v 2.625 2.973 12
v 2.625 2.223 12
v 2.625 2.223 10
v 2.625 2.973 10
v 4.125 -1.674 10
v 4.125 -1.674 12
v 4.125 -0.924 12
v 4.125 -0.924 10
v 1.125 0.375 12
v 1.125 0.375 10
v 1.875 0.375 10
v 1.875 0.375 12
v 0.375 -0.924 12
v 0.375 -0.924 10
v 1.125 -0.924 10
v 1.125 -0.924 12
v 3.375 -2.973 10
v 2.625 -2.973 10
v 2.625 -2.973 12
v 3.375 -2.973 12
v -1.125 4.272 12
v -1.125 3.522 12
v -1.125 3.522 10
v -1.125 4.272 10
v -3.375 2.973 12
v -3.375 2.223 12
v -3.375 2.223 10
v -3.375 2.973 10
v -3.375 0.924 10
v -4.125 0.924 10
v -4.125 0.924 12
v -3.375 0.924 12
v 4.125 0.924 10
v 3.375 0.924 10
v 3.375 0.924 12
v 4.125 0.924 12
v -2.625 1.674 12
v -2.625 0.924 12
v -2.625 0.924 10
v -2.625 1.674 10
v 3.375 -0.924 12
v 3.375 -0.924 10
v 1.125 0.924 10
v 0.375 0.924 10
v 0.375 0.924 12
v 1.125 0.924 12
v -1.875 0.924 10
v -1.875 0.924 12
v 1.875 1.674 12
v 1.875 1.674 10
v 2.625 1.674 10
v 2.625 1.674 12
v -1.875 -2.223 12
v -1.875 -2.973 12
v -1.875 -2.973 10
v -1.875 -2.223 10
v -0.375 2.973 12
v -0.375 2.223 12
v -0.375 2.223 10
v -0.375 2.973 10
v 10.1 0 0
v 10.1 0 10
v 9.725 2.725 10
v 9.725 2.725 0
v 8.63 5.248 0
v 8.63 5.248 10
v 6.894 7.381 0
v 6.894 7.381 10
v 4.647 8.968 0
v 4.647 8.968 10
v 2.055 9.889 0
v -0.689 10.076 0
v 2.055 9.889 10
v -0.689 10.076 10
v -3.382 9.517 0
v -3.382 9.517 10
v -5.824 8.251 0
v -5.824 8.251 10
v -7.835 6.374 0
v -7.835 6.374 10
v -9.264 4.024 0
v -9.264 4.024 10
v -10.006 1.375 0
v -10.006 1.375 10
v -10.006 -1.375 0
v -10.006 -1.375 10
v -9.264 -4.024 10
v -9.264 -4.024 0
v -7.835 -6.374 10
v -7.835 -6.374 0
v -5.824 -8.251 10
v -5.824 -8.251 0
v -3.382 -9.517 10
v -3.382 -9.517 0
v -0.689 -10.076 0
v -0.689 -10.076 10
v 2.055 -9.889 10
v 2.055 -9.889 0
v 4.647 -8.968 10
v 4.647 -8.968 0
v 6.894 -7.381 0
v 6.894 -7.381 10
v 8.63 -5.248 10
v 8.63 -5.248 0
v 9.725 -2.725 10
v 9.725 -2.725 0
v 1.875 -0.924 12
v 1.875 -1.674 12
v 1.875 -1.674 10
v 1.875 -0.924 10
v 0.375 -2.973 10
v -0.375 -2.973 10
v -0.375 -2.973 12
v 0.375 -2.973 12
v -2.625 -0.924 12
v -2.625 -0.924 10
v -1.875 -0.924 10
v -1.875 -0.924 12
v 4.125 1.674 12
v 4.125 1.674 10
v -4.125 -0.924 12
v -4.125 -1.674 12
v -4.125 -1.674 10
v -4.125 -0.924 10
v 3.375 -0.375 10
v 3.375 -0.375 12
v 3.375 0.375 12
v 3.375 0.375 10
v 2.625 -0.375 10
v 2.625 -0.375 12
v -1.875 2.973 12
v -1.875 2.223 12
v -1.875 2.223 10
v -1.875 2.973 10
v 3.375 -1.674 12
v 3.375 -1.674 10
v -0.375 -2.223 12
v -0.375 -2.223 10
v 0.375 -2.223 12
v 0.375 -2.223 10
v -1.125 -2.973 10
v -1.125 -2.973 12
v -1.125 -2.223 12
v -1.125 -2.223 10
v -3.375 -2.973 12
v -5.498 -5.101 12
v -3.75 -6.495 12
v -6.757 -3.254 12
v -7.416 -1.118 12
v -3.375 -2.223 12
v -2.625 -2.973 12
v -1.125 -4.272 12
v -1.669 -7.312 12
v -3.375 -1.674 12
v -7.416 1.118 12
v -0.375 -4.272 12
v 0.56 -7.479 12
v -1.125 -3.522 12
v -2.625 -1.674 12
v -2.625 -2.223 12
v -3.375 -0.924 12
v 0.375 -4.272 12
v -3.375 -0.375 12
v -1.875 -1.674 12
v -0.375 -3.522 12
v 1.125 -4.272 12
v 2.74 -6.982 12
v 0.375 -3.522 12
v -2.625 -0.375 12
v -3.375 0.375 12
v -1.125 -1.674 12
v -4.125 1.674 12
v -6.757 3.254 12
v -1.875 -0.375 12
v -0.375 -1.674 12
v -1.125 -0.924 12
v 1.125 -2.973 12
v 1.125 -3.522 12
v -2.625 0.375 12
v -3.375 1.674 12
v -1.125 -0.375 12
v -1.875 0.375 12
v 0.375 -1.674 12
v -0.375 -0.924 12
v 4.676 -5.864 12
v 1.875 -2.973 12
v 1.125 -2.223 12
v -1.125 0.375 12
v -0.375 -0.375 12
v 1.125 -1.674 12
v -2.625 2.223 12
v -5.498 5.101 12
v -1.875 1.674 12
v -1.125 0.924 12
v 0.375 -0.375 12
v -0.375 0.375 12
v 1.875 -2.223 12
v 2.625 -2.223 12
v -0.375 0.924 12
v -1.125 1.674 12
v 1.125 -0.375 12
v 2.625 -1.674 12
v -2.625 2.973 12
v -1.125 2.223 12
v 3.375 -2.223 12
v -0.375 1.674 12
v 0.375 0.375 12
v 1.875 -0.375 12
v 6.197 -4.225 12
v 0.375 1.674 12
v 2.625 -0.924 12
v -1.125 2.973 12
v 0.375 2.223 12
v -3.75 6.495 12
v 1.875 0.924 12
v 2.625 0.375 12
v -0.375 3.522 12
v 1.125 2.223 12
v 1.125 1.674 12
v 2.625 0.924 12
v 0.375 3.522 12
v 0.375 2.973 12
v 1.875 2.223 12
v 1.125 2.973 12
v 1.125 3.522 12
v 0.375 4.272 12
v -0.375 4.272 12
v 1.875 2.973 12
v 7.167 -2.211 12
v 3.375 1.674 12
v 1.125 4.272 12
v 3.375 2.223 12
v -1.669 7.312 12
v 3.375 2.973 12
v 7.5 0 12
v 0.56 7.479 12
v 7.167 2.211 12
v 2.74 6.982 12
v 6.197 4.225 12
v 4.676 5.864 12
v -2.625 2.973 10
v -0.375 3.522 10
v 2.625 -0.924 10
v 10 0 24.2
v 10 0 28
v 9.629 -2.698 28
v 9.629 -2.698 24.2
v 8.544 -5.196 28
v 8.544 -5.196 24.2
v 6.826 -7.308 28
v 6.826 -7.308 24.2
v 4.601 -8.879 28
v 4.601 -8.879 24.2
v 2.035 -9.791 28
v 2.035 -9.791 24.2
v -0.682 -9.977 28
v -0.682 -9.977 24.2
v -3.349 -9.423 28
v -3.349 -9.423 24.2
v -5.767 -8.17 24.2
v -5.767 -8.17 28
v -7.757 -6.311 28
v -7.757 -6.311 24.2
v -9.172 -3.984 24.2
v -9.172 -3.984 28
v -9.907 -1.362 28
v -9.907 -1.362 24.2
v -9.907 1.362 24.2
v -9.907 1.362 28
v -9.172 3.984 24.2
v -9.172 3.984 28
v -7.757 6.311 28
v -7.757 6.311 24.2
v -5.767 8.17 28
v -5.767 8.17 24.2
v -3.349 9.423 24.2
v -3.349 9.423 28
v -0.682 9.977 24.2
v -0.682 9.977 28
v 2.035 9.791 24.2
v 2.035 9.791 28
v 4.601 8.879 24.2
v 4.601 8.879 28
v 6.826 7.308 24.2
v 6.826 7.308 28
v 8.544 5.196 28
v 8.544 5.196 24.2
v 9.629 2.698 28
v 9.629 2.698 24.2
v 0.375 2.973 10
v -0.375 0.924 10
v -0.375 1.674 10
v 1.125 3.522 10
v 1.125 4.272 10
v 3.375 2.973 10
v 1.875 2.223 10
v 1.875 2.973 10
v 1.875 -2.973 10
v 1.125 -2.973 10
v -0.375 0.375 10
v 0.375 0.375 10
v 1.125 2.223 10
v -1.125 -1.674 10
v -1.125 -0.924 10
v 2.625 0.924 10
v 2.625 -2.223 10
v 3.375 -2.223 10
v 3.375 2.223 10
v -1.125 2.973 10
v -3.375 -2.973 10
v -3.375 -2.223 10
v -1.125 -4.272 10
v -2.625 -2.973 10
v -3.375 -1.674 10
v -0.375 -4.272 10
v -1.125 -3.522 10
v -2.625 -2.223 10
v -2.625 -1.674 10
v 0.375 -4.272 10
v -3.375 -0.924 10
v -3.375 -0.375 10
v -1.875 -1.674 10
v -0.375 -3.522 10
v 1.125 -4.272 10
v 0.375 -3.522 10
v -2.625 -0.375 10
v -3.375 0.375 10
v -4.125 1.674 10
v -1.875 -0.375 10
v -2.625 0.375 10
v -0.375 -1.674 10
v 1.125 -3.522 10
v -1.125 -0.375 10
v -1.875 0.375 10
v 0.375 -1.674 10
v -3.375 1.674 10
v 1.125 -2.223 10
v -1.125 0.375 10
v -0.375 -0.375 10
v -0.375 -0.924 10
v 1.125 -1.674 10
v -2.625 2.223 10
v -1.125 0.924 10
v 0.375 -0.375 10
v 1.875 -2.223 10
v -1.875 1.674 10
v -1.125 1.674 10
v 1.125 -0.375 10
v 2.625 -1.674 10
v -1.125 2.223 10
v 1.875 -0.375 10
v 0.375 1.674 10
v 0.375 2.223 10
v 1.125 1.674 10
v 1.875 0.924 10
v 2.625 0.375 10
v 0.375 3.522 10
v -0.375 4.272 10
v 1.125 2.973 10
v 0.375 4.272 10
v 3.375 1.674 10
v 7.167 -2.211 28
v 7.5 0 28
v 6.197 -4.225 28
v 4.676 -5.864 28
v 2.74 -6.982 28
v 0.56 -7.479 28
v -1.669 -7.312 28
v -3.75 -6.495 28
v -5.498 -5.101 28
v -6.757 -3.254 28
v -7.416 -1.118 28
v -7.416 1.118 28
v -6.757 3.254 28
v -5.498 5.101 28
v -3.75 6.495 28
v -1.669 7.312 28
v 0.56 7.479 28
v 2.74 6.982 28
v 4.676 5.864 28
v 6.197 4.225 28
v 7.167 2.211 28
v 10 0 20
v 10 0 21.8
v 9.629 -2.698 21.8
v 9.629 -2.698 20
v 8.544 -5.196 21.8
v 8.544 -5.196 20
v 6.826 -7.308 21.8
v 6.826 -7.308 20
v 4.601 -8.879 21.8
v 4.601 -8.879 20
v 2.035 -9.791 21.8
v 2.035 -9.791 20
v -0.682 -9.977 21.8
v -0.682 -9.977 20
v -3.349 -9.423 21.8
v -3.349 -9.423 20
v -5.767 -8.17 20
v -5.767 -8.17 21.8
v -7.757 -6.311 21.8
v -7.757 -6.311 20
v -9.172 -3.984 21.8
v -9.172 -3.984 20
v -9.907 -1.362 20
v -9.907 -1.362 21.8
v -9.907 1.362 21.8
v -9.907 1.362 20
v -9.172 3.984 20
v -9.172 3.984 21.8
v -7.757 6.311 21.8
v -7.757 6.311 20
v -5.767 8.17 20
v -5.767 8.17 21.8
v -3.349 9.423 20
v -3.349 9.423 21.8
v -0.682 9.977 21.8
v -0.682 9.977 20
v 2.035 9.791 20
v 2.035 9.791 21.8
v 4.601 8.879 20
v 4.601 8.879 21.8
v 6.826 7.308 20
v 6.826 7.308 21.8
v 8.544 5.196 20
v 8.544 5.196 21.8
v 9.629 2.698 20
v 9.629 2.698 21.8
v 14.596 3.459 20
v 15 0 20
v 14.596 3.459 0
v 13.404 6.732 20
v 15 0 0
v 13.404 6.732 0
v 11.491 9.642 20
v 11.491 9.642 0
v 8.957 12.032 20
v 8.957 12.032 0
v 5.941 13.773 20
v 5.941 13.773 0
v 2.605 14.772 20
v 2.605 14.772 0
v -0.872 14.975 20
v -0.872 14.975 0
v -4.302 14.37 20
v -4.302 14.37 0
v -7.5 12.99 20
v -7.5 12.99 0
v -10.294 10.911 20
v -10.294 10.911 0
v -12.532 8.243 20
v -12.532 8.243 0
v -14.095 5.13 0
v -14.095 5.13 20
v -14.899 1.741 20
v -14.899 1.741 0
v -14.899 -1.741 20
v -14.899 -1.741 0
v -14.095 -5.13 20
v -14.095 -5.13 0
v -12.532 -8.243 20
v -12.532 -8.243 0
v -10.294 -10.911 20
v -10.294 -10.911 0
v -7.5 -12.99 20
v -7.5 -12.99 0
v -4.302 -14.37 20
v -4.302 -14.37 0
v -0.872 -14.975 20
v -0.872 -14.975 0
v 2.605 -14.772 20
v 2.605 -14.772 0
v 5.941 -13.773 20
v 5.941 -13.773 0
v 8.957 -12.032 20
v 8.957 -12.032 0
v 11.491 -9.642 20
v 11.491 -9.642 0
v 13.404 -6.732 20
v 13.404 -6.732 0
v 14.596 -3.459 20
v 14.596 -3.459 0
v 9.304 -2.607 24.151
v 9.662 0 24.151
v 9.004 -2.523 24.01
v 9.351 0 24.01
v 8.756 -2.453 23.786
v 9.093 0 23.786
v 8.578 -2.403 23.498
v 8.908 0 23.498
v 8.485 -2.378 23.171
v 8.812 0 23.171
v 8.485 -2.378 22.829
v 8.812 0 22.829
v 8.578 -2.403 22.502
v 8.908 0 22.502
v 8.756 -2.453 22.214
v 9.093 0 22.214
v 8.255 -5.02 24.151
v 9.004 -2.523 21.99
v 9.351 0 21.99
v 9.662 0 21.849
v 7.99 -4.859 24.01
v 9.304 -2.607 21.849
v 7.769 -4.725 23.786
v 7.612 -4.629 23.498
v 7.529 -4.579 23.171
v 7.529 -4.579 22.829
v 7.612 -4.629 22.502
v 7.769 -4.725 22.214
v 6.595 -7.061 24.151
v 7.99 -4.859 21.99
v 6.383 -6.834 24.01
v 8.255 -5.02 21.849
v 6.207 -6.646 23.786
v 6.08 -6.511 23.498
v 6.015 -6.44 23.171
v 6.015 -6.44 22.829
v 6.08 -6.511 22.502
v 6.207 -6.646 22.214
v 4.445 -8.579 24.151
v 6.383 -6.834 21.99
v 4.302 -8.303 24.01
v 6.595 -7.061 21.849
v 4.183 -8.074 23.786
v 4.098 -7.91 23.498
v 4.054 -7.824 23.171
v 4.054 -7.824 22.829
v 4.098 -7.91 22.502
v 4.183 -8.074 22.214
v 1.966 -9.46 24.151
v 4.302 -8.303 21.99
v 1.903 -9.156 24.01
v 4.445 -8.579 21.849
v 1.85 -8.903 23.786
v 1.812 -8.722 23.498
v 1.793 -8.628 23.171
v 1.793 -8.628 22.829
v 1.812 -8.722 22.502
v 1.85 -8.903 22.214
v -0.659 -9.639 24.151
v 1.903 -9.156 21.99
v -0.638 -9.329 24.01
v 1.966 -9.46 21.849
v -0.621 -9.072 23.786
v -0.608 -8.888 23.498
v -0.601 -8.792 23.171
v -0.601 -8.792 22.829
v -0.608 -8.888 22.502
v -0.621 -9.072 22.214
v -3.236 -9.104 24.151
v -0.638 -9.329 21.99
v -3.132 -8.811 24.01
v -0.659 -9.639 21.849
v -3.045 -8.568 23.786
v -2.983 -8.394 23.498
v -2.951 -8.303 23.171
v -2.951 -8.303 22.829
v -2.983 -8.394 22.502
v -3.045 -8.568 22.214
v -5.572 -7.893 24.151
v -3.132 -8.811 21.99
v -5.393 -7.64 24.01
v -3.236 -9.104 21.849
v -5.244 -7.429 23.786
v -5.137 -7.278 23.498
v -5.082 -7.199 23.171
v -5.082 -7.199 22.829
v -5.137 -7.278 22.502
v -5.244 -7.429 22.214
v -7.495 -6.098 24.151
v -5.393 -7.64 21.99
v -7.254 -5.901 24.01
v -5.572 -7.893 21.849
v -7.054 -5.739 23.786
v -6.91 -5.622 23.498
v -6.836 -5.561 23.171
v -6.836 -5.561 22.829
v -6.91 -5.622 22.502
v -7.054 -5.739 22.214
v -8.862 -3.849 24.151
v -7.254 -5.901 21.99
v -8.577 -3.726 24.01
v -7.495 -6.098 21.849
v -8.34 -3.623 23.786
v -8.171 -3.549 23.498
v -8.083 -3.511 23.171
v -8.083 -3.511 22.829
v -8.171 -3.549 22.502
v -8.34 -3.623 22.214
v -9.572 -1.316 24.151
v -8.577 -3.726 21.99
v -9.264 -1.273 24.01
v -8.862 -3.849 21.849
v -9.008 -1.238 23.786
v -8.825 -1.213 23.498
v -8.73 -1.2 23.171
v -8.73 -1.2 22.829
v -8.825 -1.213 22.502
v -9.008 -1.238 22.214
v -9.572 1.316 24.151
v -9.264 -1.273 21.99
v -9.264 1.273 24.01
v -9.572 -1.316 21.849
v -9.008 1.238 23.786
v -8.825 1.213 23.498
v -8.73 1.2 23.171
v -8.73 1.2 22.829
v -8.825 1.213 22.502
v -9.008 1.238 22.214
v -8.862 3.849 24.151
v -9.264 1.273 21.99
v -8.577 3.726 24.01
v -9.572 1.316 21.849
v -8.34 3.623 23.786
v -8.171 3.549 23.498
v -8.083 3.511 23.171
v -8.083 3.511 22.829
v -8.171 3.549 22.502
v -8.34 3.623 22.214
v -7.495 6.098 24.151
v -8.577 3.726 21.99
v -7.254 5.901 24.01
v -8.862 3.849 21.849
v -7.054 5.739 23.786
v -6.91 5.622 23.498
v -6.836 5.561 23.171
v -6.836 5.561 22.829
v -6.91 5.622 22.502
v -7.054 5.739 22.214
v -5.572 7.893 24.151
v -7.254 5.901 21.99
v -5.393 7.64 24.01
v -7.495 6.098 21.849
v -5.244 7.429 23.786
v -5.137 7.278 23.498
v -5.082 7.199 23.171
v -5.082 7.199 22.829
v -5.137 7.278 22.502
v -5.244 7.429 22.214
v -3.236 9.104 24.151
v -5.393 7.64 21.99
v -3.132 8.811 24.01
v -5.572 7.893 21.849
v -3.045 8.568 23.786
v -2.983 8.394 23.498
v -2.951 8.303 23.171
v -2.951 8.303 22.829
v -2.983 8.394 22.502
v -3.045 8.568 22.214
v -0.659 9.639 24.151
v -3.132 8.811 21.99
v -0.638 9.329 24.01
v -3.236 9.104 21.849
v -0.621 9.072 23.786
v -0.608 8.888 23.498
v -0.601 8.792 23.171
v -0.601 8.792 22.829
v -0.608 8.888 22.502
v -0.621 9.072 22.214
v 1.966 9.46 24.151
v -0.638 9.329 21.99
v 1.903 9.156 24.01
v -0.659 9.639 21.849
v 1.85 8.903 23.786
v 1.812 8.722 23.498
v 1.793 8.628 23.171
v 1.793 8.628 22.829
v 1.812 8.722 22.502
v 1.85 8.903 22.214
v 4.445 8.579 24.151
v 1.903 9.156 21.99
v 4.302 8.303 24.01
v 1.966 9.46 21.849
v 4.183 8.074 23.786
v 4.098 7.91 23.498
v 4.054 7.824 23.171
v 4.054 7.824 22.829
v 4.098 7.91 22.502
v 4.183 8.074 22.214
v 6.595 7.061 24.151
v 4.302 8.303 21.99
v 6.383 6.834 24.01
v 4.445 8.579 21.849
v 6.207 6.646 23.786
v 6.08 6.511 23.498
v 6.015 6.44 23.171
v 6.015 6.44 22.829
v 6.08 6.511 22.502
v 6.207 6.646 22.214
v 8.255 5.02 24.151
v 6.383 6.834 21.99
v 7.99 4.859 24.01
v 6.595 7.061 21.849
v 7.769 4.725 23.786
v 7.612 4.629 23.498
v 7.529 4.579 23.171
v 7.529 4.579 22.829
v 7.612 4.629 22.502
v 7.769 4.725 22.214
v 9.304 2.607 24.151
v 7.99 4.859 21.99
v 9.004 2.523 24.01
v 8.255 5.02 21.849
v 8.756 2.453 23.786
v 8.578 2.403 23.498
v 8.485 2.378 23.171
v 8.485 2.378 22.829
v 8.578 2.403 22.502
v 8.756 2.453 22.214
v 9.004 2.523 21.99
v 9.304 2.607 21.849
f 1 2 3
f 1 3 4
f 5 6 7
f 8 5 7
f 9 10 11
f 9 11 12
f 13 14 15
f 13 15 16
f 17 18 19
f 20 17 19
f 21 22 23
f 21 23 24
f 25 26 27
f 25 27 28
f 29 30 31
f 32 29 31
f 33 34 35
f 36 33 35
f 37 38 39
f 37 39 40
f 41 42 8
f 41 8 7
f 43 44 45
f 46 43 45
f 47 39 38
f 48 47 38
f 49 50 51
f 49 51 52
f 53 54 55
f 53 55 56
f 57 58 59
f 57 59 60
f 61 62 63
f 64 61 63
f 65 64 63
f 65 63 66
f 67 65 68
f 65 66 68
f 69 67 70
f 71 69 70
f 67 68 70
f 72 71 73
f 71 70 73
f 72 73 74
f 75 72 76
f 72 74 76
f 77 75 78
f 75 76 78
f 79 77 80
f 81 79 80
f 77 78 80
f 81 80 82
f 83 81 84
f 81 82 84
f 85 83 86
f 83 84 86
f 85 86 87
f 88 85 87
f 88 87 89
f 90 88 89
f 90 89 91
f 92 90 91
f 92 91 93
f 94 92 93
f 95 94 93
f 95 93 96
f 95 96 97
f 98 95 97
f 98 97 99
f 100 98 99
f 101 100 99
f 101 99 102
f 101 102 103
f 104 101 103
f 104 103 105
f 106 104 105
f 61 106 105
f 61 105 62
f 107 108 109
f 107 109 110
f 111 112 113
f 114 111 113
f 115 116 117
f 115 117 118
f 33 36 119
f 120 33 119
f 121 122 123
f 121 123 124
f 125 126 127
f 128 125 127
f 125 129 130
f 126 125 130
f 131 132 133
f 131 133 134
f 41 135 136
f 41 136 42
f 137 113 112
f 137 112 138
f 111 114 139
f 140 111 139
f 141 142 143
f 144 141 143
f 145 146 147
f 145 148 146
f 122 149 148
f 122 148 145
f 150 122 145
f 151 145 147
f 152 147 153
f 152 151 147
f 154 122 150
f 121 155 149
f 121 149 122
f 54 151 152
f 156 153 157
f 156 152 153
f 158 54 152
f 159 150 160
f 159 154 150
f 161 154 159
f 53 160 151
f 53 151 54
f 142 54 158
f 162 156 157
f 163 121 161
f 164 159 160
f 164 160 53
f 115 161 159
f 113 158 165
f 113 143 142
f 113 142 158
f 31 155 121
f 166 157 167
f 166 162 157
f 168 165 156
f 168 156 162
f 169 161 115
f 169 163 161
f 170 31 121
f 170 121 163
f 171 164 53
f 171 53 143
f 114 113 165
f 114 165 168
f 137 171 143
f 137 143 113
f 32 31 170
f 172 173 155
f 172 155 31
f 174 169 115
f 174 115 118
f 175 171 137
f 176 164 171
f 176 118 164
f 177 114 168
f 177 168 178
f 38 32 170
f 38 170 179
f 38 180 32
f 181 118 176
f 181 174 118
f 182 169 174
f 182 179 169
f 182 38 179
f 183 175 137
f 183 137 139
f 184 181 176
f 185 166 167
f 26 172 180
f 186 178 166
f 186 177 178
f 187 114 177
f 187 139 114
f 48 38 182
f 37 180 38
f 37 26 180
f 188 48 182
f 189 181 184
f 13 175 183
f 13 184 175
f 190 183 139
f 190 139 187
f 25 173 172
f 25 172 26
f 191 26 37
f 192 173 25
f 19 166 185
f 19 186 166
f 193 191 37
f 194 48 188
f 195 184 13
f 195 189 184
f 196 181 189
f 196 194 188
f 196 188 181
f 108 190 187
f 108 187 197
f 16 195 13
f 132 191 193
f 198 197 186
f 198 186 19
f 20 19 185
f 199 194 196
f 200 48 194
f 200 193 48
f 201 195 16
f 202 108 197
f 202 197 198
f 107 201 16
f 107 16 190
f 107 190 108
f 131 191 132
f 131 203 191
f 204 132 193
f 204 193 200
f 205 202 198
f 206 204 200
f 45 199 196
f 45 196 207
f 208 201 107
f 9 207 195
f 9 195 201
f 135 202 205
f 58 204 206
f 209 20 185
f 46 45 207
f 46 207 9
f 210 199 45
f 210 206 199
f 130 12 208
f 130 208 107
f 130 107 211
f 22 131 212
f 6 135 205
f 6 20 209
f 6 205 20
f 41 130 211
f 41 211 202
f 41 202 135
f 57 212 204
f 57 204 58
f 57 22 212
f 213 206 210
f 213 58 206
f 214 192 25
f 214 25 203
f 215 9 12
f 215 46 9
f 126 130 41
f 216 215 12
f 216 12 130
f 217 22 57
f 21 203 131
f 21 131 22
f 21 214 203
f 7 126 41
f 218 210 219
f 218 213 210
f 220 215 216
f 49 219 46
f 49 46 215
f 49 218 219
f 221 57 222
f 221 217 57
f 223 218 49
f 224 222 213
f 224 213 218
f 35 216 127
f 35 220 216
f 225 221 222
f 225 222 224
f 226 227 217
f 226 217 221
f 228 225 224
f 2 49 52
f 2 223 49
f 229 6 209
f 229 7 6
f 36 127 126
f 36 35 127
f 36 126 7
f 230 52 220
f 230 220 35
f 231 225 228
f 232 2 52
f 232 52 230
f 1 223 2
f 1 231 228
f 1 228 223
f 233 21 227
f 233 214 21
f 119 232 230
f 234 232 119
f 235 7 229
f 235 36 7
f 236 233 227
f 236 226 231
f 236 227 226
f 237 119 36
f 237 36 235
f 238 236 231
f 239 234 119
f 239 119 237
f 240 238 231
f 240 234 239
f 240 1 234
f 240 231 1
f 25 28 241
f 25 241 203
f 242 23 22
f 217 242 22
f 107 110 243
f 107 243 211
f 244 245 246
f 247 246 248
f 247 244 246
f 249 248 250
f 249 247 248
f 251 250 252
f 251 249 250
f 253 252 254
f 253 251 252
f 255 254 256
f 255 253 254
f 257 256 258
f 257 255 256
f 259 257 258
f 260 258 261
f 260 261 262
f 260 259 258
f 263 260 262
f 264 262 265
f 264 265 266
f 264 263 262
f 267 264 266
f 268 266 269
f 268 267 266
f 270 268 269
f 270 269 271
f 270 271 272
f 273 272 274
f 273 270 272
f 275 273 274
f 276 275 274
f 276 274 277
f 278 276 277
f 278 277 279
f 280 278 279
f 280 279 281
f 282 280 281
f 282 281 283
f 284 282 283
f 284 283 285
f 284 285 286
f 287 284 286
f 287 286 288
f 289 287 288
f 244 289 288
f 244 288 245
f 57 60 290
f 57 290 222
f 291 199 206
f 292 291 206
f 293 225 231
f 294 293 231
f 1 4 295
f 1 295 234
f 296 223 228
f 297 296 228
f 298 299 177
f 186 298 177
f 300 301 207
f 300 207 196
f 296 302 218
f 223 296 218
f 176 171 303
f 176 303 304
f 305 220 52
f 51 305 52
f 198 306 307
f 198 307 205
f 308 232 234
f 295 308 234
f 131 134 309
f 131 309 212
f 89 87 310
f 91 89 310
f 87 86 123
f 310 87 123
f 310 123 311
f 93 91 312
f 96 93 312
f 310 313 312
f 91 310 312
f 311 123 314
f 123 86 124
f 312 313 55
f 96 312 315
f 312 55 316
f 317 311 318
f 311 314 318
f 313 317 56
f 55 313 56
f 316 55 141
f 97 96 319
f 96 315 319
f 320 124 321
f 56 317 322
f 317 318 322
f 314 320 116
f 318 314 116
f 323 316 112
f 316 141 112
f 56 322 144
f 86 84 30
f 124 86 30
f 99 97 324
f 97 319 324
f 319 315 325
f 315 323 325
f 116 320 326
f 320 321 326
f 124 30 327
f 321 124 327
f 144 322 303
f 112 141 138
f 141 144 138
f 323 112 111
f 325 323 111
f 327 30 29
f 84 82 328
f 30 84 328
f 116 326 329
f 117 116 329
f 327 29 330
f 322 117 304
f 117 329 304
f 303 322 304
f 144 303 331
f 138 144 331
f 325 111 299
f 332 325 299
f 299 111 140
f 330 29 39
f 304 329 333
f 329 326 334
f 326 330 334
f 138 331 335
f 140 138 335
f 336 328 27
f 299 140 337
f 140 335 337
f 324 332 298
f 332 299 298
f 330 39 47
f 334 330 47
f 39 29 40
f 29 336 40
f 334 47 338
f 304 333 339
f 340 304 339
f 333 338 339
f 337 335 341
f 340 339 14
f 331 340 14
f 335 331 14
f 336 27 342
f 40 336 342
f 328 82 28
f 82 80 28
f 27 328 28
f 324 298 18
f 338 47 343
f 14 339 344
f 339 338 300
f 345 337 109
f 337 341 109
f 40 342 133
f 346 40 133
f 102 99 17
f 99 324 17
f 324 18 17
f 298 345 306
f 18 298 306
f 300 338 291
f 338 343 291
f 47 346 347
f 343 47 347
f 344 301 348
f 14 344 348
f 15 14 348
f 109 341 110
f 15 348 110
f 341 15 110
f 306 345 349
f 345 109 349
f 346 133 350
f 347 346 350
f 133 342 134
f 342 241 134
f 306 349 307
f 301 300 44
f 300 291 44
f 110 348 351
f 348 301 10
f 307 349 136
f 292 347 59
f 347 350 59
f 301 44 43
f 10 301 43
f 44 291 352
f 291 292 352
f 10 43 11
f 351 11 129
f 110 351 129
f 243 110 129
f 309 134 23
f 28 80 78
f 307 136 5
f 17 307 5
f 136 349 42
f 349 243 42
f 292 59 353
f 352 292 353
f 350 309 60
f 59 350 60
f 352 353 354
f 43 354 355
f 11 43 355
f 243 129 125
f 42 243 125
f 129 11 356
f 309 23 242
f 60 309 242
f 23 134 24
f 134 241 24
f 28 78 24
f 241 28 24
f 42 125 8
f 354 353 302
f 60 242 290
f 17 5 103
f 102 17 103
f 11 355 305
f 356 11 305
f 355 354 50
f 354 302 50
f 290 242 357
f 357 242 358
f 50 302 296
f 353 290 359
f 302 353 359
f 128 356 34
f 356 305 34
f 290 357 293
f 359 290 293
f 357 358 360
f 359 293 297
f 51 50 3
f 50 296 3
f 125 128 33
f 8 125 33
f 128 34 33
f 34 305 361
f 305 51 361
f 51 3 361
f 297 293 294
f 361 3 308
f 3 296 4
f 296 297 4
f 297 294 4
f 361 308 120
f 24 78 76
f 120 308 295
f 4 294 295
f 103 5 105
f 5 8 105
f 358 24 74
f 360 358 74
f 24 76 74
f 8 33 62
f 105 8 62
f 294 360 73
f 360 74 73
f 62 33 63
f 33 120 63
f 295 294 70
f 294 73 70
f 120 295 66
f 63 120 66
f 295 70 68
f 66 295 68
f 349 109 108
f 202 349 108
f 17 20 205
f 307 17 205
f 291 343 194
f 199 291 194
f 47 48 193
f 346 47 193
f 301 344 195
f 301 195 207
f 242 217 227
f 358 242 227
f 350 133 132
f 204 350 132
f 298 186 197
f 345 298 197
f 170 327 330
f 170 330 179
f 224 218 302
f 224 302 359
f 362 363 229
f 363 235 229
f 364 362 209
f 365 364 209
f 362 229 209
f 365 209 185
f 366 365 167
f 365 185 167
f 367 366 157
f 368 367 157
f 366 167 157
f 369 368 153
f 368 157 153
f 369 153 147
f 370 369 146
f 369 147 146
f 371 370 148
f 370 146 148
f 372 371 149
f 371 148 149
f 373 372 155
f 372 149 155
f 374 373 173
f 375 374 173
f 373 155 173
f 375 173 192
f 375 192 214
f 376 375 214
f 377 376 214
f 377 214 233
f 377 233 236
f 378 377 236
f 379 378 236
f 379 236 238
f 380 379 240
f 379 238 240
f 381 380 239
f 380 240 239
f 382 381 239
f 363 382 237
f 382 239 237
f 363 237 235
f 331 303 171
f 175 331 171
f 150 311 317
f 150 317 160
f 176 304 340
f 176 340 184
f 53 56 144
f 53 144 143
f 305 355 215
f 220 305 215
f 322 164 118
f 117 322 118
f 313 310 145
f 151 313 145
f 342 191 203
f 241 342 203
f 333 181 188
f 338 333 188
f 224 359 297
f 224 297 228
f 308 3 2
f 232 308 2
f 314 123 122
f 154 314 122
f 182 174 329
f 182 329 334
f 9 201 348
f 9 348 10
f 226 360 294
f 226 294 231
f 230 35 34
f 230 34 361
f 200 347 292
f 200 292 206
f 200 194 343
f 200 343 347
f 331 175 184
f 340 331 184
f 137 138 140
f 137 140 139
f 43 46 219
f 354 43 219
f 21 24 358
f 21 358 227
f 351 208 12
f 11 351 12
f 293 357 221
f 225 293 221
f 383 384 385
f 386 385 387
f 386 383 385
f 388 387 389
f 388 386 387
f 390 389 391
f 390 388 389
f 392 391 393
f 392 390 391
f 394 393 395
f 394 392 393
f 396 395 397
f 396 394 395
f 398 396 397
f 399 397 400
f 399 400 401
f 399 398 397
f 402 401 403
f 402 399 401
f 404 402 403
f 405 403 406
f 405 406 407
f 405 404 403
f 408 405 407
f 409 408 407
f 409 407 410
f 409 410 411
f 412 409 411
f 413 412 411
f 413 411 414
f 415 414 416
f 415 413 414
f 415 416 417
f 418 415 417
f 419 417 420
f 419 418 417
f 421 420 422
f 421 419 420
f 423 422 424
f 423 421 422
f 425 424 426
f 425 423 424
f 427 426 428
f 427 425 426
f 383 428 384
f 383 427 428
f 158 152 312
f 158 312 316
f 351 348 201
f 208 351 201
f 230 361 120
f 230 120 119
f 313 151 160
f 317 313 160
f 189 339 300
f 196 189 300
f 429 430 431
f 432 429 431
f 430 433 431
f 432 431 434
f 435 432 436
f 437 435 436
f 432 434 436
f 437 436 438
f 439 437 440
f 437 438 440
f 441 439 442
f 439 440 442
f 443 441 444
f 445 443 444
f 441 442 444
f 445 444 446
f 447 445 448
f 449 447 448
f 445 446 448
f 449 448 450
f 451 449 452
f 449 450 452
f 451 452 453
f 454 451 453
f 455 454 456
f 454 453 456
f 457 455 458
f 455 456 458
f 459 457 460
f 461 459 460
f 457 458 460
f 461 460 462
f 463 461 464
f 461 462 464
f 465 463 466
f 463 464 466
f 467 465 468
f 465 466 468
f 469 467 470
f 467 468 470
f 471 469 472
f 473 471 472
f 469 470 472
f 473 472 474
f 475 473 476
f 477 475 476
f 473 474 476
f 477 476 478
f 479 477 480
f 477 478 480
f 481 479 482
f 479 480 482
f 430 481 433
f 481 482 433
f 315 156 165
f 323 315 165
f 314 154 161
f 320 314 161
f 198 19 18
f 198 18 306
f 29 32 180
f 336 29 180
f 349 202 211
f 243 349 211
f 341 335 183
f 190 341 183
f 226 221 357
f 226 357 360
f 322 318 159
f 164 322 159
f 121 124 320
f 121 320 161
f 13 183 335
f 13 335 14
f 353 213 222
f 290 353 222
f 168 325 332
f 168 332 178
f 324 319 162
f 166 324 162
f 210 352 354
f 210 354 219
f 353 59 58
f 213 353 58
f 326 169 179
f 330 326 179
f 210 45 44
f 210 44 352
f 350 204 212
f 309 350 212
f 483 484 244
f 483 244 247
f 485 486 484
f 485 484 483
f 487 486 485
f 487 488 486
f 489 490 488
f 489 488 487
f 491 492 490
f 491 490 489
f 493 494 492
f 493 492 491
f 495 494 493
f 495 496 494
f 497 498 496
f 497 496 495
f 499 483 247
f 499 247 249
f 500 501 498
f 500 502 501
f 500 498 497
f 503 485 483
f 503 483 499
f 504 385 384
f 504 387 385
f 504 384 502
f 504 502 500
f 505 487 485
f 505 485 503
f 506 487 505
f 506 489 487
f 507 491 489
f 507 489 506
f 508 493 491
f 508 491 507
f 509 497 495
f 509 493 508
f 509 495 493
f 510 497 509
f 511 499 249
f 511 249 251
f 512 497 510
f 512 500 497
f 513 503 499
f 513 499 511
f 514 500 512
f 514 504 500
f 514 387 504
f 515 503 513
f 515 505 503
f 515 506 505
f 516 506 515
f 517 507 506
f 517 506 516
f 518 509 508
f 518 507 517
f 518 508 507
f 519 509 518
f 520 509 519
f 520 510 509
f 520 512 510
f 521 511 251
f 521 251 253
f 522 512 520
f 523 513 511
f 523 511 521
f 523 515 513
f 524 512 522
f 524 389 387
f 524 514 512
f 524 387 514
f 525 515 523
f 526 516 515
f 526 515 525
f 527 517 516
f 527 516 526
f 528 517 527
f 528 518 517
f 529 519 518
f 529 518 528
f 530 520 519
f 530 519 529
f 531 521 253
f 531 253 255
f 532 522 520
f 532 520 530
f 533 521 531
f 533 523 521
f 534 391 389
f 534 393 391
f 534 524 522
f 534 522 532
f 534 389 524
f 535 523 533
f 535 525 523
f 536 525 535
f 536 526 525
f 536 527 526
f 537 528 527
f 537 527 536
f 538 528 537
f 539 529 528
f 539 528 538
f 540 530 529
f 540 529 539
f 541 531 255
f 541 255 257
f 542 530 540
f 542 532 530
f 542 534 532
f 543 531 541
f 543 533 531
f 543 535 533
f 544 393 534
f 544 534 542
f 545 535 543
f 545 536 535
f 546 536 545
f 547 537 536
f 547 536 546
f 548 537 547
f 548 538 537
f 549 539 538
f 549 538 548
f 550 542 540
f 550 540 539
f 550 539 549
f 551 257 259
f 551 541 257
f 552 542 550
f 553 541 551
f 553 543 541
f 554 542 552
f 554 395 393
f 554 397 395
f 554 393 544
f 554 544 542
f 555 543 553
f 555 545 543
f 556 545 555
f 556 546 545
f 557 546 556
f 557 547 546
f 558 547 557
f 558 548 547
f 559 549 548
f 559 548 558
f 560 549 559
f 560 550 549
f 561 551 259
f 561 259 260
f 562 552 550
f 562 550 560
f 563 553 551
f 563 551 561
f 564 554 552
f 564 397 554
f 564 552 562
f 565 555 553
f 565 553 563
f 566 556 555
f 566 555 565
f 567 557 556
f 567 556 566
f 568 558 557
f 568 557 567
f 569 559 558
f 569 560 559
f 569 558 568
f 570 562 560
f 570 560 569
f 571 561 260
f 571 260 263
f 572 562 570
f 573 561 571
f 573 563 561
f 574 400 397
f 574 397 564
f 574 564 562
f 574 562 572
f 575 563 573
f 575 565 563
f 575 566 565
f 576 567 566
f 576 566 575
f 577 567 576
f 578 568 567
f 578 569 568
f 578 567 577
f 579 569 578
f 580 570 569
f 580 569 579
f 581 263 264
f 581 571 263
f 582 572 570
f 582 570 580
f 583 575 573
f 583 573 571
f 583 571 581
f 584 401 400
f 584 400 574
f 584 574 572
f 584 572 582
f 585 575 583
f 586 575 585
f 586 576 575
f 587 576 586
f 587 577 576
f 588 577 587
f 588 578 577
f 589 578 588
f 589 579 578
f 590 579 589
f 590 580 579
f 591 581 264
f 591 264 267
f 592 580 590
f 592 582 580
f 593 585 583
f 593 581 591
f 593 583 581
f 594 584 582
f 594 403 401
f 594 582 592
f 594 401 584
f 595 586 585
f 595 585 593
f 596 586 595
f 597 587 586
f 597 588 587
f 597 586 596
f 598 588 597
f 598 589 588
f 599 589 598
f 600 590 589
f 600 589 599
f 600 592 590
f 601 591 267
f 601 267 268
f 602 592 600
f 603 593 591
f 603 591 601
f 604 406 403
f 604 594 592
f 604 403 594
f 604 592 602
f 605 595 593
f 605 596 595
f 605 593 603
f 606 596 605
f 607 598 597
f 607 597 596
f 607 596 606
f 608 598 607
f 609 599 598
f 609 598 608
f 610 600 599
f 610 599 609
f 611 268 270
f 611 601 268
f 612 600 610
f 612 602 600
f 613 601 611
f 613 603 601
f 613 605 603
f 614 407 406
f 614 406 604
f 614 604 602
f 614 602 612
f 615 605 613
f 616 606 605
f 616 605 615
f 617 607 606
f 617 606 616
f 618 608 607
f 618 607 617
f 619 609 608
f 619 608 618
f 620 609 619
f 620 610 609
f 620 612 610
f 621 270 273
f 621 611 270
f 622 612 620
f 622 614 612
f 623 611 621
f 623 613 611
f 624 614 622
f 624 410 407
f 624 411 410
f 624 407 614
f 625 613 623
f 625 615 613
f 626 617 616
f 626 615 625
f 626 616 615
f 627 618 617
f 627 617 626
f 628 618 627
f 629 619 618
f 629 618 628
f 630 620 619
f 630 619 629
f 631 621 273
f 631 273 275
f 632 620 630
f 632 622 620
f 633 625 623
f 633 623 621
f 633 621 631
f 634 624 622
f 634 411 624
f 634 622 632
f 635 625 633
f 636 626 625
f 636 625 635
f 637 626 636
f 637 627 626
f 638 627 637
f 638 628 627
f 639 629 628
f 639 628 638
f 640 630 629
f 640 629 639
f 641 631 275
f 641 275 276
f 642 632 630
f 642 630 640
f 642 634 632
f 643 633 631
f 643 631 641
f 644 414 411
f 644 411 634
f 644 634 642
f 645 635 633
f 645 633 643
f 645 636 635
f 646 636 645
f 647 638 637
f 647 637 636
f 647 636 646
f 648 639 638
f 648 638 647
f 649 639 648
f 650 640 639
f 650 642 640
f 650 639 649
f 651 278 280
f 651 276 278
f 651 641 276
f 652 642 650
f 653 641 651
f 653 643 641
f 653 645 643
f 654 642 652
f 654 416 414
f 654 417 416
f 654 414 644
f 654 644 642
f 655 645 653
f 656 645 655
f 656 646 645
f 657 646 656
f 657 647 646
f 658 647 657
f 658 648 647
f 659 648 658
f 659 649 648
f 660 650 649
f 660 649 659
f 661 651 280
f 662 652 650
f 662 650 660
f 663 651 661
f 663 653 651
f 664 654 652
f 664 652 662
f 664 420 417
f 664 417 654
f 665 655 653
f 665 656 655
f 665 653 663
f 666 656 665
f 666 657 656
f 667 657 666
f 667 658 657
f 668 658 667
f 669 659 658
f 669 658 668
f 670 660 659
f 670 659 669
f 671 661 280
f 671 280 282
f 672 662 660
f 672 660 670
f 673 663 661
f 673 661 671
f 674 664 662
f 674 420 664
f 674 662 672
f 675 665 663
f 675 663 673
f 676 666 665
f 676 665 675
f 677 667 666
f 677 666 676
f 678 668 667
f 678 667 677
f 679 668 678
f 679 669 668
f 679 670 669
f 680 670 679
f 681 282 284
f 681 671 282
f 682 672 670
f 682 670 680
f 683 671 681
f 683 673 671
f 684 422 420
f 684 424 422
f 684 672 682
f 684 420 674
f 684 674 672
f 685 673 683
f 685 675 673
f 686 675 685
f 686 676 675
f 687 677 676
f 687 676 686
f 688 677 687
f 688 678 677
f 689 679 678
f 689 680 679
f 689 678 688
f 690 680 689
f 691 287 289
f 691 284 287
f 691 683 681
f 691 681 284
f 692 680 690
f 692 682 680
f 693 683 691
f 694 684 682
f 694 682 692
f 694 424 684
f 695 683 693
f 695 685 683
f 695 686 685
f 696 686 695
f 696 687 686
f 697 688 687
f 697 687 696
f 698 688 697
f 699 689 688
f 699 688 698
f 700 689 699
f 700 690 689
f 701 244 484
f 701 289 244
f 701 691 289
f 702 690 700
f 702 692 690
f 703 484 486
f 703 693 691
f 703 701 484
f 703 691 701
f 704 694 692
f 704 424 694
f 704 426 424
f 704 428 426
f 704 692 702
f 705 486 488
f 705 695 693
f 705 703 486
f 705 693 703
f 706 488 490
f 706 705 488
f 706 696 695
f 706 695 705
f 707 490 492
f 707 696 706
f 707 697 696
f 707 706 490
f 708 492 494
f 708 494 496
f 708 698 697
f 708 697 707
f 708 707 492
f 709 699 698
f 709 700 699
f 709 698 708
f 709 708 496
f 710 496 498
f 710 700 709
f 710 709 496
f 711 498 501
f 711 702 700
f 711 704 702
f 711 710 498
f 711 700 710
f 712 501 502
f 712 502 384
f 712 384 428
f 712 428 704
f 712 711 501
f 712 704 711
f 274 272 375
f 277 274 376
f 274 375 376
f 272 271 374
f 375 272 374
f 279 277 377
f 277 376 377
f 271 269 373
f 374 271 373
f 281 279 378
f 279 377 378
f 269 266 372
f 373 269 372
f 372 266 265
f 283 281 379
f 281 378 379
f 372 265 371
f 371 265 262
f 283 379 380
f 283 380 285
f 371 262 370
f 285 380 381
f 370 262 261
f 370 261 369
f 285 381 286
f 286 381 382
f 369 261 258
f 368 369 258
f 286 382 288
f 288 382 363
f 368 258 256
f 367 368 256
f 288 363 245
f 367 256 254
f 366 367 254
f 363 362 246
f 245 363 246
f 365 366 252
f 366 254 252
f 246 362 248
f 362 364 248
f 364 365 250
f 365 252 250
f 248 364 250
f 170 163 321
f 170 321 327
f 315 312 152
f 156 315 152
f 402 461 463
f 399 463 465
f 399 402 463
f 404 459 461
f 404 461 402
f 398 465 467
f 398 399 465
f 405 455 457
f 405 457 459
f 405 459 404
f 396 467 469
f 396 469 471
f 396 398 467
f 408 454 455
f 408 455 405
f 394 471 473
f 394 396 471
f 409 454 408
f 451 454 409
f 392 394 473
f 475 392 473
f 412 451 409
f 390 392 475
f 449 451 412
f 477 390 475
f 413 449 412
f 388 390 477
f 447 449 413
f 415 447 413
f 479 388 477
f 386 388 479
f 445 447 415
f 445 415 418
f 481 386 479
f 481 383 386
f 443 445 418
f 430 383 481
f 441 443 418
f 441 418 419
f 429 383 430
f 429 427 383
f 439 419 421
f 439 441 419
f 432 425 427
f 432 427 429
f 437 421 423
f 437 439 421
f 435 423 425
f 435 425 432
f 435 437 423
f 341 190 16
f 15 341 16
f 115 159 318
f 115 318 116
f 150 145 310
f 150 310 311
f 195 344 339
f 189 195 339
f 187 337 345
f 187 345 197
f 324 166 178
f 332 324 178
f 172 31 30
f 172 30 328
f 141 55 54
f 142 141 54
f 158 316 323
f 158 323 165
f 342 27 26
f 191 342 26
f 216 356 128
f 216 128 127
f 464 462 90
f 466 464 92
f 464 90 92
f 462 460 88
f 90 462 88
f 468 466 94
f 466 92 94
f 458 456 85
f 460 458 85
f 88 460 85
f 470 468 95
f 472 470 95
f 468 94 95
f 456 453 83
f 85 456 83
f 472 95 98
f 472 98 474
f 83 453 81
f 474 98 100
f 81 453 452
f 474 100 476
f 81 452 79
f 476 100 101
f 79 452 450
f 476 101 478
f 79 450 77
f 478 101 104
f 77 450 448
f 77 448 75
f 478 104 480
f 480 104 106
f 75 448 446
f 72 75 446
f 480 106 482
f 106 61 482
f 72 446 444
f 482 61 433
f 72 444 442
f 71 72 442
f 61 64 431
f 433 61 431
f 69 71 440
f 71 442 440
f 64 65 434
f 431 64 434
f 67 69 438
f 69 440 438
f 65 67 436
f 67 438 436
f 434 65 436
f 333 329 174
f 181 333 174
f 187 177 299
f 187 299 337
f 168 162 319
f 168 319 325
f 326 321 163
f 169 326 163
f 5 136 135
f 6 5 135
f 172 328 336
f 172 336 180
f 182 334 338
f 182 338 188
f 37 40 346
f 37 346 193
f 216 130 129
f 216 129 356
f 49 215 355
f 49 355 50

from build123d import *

# Parameters (mm, degrees)
SKETCH1_R                  = 15
BOSS_EXTRUDE1_DEPTH        = 10
SKETCH2_R                  = 10.1
CUT_EXTRUDE1_DEPTH         = 20
SKETCH3_R                  = 15
BOSS_EXTRUDE2_DEPTH        = 10
SKETCH5_R                  = 10
CUT_EXTRUDE3_DEPTH         = 8
SKETCH8_W                  = 0.75
SKETCH8_H                  = 0.75
CUT_EXTRUDE5_DEPTH         = 2
FILL_START                 = -1.125
FILL_PATTERN2_OUTLINE_W    = 0.75
FILL_PATTERN2_OUTLINE_H    = 2
FILL_PATTERN2_DEPTH        = 0.75
FILL_START_2               = 0.375
FILL_PATTERN2_2_OUTLINE_W  = 0.75
FILL_PATTERN2_2_OUTLINE_H  = 2
FILL_PATTERN2_2_DEPTH      = 0.75
FILL_START_3               = -3.375
FILL_PATTERN2_3_OUTLINE_W  = 0.75
FILL_PATTERN2_3_OUTLINE_H  = 2
FILL_PATTERN2_3_DEPTH      = 0.75
FILL_START_4               = -1.875
FILL_PATTERN2_4_OUTLINE_W  = 0.75
FILL_PATTERN2_4_OUTLINE_H  = 2
FILL_PATTERN2_4_DEPTH      = 0.75
FILL_START_5               = 1.125
FILL_PATTERN2_5_OUTLINE_W  = 0.75
FILL_PATTERN2_5_OUTLINE_H  = 2
FILL_PATTERN2_5_DEPTH      = 0.75
FILL_START_6               = 2.625
FILL_PATTERN2_6_OUTLINE_W  = 0.75
FILL_PATTERN2_6_OUTLINE_H  = 2
FILL_PATTERN2_6_DEPTH      = 0.75
FILL_START_7               = -4.125
FILL_PATTERN2_7_OUTLINE_W  = 0.75
FILL_PATTERN2_7_OUTLINE_H  = 2
FILL_PATTERN2_7_DEPTH      = 0.75
FILL_START_8               = -2.625
FILL_PATTERN2_8_OUTLINE_W  = 0.75
FILL_PATTERN2_8_OUTLINE_H  = 2
FILL_PATTERN2_8_DEPTH      = 0.75
FILL_START_9               = -0.375
FILL_PATTERN2_9_OUTLINE_W  = 0.75
FILL_PATTERN2_9_OUTLINE_H  = 2
FILL_PATTERN2_9_DEPTH      = 0.75
FILL_START_10              = 1.875
FILL_PATTERN2_10_OUTLINE_W = 0.75
FILL_PATTERN2_10_OUTLINE_H = 2
FILL_PATTERN2_10_DEPTH     = 0.75
FILL_START_11              = 3.375
FILL_PATTERN2_11_OUTLINE_W = 0.75
FILL_PATTERN2_11_OUTLINE_H = 2
FILL_PATTERN2_11_DEPTH     = 0.75
SKETCH15_W                 = 16
SKETCH15_H                 = 2.5
SKETCH16_R                 = 1.2


# Read off the part's stored shape, not the designer's step: Fill Pattern2
with BuildPart() as part:
    # Sketch1 → Boss-Extrude1 (new body)
    with BuildSketch(Plane.XY):
        Circle(SKETCH1_R)
    extrude(amount=BOSS_EXTRUDE1_DEPTH)

    # Sketch2 → Cut-Extrude1 (cut)
    with BuildSketch(Plane.XY.offset(10)):
        Circle(SKETCH2_R)
    extrude(amount=-CUT_EXTRUDE1_DEPTH, mode=Mode.SUBTRACT)

    # Sketch3 → Boss-Extrude2 (add)
    with BuildSketch(Plane.XY.offset(10)):
        Circle(SKETCH3_R)
    extrude(amount=BOSS_EXTRUDE2_DEPTH)

    # Sketch5 → Cut-Extrude3 (cut)
    with BuildSketch(Plane.XY.offset(20)):
        Circle(SKETCH5_R)
    extrude(amount=-CUT_EXTRUDE3_DEPTH, mode=Mode.SUBTRACT)

    # Sketch8 → Cut-Extrude5 (cut)
    with BuildSketch(Plane(origin=(0, 0, 10), x_dir=(-1, 0, 0), z_dir=(0, 0, -1))):
        Rectangle(SKETCH8_W, SKETCH8_H)
    extrude(amount=-CUT_EXTRUDE5_DEPTH, mode=Mode.SUBTRACT)

    # Fill Pattern2 outline → Fill Pattern2 (cut)
    with BuildSketch(Plane.YZ.offset(FILL_START)):
        with Locations((-1.299038106, 11)):
            Rectangle(FILL_PATTERN2_OUTLINE_W, FILL_PATTERN2_OUTLINE_H)
        with Locations((1.299038106, 11)):
            Rectangle(FILL_PATTERN2_OUTLINE_W, FILL_PATTERN2_OUTLINE_H)
        with Locations((-3.897114317, 11)):
            Rectangle(FILL_PATTERN2_OUTLINE_W, FILL_PATTERN2_OUTLINE_H)
        with Locations((3.897114317, 11)):
            Rectangle(FILL_PATTERN2_OUTLINE_W, FILL_PATTERN2_OUTLINE_H)
    extrude(amount=FILL_PATTERN2_DEPTH, mode=Mode.SUBTRACT)

    # Fill Pattern2 2 outline → Fill Pattern2 2 (cut)
    with BuildSketch(Plane.YZ.offset(FILL_START_2)):
        with Locations((-1.299038106, 11)):
            Rectangle(FILL_PATTERN2_2_OUTLINE_W, FILL_PATTERN2_2_OUTLINE_H)
        with Locations((1.299038106, 11)):
            Rectangle(FILL_PATTERN2_2_OUTLINE_W, FILL_PATTERN2_2_OUTLINE_H)
        with Locations((-3.897114317, 11)):
            Rectangle(FILL_PATTERN2_2_OUTLINE_W, FILL_PATTERN2_2_OUTLINE_H)
        with Locations((3.897114317, 11)):
            Rectangle(FILL_PATTERN2_2_OUTLINE_W, FILL_PATTERN2_2_OUTLINE_H)
    extrude(amount=FILL_PATTERN2_2_DEPTH, mode=Mode.SUBTRACT)

    # Fill Pattern2 3 outline → Fill Pattern2 3 (cut)
    with BuildSketch(Plane.YZ.offset(FILL_START_3)):
        with Locations((0, 11)):
            Rectangle(FILL_PATTERN2_3_OUTLINE_W, FILL_PATTERN2_3_OUTLINE_H)
        with Locations((-2.598076211, 11)):
            Rectangle(FILL_PATTERN2_3_OUTLINE_W, FILL_PATTERN2_3_OUTLINE_H)
        with Locations((2.598076211, 11)):
            Rectangle(FILL_PATTERN2_3_OUTLINE_W, FILL_PATTERN2_3_OUTLINE_H)
    extrude(amount=FILL_PATTERN2_3_DEPTH, mode=Mode.SUBTRACT)

    # Fill Pattern2 4 outline → Fill Pattern2 4 (cut)
    with BuildSketch(Plane.YZ.offset(FILL_START_4)):
        with Locations((0, 11)):
            Rectangle(FILL_PATTERN2_4_OUTLINE_W, FILL_PATTERN2_4_OUTLINE_H)
        with Locations((-2.598076211, 11)):
            Rectangle(FILL_PATTERN2_4_OUTLINE_W, FILL_PATTERN2_4_OUTLINE_H)
        with Locations((2.598076211, 11)):
            Rectangle(FILL_PATTERN2_4_OUTLINE_W, FILL_PATTERN2_4_OUTLINE_H)
    extrude(amount=FILL_PATTERN2_4_DEPTH, mode=Mode.SUBTRACT)

    # Fill Pattern2 5 outline → Fill Pattern2 5 (cut)
    with BuildSketch(Plane.YZ.offset(FILL_START_5)):
        with Locations((0, 11)):
            Rectangle(FILL_PATTERN2_5_OUTLINE_W, FILL_PATTERN2_5_OUTLINE_H)
        with Locations((-2.598076211, 11)):
            Rectangle(FILL_PATTERN2_5_OUTLINE_W, FILL_PATTERN2_5_OUTLINE_H)
        with Locations((2.598076211, 11)):
            Rectangle(FILL_PATTERN2_5_OUTLINE_W, FILL_PATTERN2_5_OUTLINE_H)
    extrude(amount=FILL_PATTERN2_5_DEPTH, mode=Mode.SUBTRACT)

    # Fill Pattern2 6 outline → Fill Pattern2 6 (cut)
    with BuildSketch(Plane.YZ.offset(FILL_START_6)):
        with Locations((0, 11)):
            Rectangle(FILL_PATTERN2_6_OUTLINE_W, FILL_PATTERN2_6_OUTLINE_H)
        with Locations((-2.598076211, 11)):
            Rectangle(FILL_PATTERN2_6_OUTLINE_W, FILL_PATTERN2_6_OUTLINE_H)
        with Locations((2.598076211, 11)):
            Rectangle(FILL_PATTERN2_6_OUTLINE_W, FILL_PATTERN2_6_OUTLINE_H)
    extrude(amount=FILL_PATTERN2_6_DEPTH, mode=Mode.SUBTRACT)

    # Fill Pattern2 7 outline → Fill Pattern2 7 (cut)
    with BuildSketch(Plane.YZ.offset(FILL_START_7)):
        with Locations((-1.299038106, 11)):
            Rectangle(FILL_PATTERN2_7_OUTLINE_W, FILL_PATTERN2_7_OUTLINE_H)
        with Locations((1.299038106, 11)):
            Rectangle(FILL_PATTERN2_7_OUTLINE_W, FILL_PATTERN2_7_OUTLINE_H)
    extrude(amount=FILL_PATTERN2_7_DEPTH, mode=Mode.SUBTRACT)

    # Fill Pattern2 8 outline → Fill Pattern2 8 (cut)
    with BuildSketch(Plane.YZ.offset(FILL_START_8)):
        with Locations((-1.299038106, 11)):
            Rectangle(FILL_PATTERN2_8_OUTLINE_W, FILL_PATTERN2_8_OUTLINE_H)
        with Locations((1.299038106, 11)):
            Rectangle(FILL_PATTERN2_8_OUTLINE_W, FILL_PATTERN2_8_OUTLINE_H)
    extrude(amount=FILL_PATTERN2_8_DEPTH, mode=Mode.SUBTRACT)

    # Fill Pattern2 9 outline → Fill Pattern2 9 (cut)
    with BuildSketch(Plane.YZ.offset(FILL_START_9)):
        with Locations((-2.598076211, 11)):
            Rectangle(FILL_PATTERN2_9_OUTLINE_W, FILL_PATTERN2_9_OUTLINE_H)
        with Locations((2.598076211, 11)):
            Rectangle(FILL_PATTERN2_9_OUTLINE_W, FILL_PATTERN2_9_OUTLINE_H)
    extrude(amount=FILL_PATTERN2_9_DEPTH, mode=Mode.SUBTRACT)

    # Fill Pattern2 10 outline → Fill Pattern2 10 (cut)
    with BuildSketch(Plane.YZ.offset(FILL_START_10)):
        with Locations((-1.299038106, 11)):
            Rectangle(FILL_PATTERN2_10_OUTLINE_W, FILL_PATTERN2_10_OUTLINE_H)
        with Locations((1.299038106, 11)):
            Rectangle(FILL_PATTERN2_10_OUTLINE_W, FILL_PATTERN2_10_OUTLINE_H)
    extrude(amount=FILL_PATTERN2_10_DEPTH, mode=Mode.SUBTRACT)

    # Fill Pattern2 11 outline → Fill Pattern2 11 (cut)
    with BuildSketch(Plane.YZ.offset(FILL_START_11)):
        with Locations((-1.299038106, 11)):
            Rectangle(FILL_PATTERN2_11_OUTLINE_W, FILL_PATTERN2_11_OUTLINE_H)
        with Locations((1.299038106, 11)):
            Rectangle(FILL_PATTERN2_11_OUTLINE_W, FILL_PATTERN2_11_OUTLINE_H)
    extrude(amount=FILL_PATTERN2_11_DEPTH, mode=Mode.SUBTRACT)

    # Sketch15 → Revolve2 (revolve)
    with BuildSketch(Plane(origin=(0, 0, 0), x_dir=(0, 0, -1), z_dir=(1, 0, 0)), mode=Mode.PRIVATE) as revolve2_sk:
        with Locations((-20, -8.75)):
            Rectangle(SKETCH15_W, SKETCH15_H)
    revolve(revolve2_sk.sketch.rotate(Axis((0, 0, 20), (0, 0, -1)), 270), axis=Axis((0, 0, 20), (0, 0, -1)))

    # Sketch16 → Cut-Revolve2 (revolve, cut)
    with BuildSketch(Plane(origin=(0, 0, 0), x_dir=(0, 0, -1), z_dir=(1, 0, 0)), mode=Mode.PRIVATE) as cut_revolve2_sk:
        with Locations((-23, 10)):
            Circle(SKETCH16_R)
    revolve(cut_revolve2_sk.sketch.rotate(Axis((0, 0, 20), (0, 0, -1)), 90), axis=Axis((0, 0, 20), (0, 0, -1)), mode=Mode.SUBTRACT)


solid = part.part
